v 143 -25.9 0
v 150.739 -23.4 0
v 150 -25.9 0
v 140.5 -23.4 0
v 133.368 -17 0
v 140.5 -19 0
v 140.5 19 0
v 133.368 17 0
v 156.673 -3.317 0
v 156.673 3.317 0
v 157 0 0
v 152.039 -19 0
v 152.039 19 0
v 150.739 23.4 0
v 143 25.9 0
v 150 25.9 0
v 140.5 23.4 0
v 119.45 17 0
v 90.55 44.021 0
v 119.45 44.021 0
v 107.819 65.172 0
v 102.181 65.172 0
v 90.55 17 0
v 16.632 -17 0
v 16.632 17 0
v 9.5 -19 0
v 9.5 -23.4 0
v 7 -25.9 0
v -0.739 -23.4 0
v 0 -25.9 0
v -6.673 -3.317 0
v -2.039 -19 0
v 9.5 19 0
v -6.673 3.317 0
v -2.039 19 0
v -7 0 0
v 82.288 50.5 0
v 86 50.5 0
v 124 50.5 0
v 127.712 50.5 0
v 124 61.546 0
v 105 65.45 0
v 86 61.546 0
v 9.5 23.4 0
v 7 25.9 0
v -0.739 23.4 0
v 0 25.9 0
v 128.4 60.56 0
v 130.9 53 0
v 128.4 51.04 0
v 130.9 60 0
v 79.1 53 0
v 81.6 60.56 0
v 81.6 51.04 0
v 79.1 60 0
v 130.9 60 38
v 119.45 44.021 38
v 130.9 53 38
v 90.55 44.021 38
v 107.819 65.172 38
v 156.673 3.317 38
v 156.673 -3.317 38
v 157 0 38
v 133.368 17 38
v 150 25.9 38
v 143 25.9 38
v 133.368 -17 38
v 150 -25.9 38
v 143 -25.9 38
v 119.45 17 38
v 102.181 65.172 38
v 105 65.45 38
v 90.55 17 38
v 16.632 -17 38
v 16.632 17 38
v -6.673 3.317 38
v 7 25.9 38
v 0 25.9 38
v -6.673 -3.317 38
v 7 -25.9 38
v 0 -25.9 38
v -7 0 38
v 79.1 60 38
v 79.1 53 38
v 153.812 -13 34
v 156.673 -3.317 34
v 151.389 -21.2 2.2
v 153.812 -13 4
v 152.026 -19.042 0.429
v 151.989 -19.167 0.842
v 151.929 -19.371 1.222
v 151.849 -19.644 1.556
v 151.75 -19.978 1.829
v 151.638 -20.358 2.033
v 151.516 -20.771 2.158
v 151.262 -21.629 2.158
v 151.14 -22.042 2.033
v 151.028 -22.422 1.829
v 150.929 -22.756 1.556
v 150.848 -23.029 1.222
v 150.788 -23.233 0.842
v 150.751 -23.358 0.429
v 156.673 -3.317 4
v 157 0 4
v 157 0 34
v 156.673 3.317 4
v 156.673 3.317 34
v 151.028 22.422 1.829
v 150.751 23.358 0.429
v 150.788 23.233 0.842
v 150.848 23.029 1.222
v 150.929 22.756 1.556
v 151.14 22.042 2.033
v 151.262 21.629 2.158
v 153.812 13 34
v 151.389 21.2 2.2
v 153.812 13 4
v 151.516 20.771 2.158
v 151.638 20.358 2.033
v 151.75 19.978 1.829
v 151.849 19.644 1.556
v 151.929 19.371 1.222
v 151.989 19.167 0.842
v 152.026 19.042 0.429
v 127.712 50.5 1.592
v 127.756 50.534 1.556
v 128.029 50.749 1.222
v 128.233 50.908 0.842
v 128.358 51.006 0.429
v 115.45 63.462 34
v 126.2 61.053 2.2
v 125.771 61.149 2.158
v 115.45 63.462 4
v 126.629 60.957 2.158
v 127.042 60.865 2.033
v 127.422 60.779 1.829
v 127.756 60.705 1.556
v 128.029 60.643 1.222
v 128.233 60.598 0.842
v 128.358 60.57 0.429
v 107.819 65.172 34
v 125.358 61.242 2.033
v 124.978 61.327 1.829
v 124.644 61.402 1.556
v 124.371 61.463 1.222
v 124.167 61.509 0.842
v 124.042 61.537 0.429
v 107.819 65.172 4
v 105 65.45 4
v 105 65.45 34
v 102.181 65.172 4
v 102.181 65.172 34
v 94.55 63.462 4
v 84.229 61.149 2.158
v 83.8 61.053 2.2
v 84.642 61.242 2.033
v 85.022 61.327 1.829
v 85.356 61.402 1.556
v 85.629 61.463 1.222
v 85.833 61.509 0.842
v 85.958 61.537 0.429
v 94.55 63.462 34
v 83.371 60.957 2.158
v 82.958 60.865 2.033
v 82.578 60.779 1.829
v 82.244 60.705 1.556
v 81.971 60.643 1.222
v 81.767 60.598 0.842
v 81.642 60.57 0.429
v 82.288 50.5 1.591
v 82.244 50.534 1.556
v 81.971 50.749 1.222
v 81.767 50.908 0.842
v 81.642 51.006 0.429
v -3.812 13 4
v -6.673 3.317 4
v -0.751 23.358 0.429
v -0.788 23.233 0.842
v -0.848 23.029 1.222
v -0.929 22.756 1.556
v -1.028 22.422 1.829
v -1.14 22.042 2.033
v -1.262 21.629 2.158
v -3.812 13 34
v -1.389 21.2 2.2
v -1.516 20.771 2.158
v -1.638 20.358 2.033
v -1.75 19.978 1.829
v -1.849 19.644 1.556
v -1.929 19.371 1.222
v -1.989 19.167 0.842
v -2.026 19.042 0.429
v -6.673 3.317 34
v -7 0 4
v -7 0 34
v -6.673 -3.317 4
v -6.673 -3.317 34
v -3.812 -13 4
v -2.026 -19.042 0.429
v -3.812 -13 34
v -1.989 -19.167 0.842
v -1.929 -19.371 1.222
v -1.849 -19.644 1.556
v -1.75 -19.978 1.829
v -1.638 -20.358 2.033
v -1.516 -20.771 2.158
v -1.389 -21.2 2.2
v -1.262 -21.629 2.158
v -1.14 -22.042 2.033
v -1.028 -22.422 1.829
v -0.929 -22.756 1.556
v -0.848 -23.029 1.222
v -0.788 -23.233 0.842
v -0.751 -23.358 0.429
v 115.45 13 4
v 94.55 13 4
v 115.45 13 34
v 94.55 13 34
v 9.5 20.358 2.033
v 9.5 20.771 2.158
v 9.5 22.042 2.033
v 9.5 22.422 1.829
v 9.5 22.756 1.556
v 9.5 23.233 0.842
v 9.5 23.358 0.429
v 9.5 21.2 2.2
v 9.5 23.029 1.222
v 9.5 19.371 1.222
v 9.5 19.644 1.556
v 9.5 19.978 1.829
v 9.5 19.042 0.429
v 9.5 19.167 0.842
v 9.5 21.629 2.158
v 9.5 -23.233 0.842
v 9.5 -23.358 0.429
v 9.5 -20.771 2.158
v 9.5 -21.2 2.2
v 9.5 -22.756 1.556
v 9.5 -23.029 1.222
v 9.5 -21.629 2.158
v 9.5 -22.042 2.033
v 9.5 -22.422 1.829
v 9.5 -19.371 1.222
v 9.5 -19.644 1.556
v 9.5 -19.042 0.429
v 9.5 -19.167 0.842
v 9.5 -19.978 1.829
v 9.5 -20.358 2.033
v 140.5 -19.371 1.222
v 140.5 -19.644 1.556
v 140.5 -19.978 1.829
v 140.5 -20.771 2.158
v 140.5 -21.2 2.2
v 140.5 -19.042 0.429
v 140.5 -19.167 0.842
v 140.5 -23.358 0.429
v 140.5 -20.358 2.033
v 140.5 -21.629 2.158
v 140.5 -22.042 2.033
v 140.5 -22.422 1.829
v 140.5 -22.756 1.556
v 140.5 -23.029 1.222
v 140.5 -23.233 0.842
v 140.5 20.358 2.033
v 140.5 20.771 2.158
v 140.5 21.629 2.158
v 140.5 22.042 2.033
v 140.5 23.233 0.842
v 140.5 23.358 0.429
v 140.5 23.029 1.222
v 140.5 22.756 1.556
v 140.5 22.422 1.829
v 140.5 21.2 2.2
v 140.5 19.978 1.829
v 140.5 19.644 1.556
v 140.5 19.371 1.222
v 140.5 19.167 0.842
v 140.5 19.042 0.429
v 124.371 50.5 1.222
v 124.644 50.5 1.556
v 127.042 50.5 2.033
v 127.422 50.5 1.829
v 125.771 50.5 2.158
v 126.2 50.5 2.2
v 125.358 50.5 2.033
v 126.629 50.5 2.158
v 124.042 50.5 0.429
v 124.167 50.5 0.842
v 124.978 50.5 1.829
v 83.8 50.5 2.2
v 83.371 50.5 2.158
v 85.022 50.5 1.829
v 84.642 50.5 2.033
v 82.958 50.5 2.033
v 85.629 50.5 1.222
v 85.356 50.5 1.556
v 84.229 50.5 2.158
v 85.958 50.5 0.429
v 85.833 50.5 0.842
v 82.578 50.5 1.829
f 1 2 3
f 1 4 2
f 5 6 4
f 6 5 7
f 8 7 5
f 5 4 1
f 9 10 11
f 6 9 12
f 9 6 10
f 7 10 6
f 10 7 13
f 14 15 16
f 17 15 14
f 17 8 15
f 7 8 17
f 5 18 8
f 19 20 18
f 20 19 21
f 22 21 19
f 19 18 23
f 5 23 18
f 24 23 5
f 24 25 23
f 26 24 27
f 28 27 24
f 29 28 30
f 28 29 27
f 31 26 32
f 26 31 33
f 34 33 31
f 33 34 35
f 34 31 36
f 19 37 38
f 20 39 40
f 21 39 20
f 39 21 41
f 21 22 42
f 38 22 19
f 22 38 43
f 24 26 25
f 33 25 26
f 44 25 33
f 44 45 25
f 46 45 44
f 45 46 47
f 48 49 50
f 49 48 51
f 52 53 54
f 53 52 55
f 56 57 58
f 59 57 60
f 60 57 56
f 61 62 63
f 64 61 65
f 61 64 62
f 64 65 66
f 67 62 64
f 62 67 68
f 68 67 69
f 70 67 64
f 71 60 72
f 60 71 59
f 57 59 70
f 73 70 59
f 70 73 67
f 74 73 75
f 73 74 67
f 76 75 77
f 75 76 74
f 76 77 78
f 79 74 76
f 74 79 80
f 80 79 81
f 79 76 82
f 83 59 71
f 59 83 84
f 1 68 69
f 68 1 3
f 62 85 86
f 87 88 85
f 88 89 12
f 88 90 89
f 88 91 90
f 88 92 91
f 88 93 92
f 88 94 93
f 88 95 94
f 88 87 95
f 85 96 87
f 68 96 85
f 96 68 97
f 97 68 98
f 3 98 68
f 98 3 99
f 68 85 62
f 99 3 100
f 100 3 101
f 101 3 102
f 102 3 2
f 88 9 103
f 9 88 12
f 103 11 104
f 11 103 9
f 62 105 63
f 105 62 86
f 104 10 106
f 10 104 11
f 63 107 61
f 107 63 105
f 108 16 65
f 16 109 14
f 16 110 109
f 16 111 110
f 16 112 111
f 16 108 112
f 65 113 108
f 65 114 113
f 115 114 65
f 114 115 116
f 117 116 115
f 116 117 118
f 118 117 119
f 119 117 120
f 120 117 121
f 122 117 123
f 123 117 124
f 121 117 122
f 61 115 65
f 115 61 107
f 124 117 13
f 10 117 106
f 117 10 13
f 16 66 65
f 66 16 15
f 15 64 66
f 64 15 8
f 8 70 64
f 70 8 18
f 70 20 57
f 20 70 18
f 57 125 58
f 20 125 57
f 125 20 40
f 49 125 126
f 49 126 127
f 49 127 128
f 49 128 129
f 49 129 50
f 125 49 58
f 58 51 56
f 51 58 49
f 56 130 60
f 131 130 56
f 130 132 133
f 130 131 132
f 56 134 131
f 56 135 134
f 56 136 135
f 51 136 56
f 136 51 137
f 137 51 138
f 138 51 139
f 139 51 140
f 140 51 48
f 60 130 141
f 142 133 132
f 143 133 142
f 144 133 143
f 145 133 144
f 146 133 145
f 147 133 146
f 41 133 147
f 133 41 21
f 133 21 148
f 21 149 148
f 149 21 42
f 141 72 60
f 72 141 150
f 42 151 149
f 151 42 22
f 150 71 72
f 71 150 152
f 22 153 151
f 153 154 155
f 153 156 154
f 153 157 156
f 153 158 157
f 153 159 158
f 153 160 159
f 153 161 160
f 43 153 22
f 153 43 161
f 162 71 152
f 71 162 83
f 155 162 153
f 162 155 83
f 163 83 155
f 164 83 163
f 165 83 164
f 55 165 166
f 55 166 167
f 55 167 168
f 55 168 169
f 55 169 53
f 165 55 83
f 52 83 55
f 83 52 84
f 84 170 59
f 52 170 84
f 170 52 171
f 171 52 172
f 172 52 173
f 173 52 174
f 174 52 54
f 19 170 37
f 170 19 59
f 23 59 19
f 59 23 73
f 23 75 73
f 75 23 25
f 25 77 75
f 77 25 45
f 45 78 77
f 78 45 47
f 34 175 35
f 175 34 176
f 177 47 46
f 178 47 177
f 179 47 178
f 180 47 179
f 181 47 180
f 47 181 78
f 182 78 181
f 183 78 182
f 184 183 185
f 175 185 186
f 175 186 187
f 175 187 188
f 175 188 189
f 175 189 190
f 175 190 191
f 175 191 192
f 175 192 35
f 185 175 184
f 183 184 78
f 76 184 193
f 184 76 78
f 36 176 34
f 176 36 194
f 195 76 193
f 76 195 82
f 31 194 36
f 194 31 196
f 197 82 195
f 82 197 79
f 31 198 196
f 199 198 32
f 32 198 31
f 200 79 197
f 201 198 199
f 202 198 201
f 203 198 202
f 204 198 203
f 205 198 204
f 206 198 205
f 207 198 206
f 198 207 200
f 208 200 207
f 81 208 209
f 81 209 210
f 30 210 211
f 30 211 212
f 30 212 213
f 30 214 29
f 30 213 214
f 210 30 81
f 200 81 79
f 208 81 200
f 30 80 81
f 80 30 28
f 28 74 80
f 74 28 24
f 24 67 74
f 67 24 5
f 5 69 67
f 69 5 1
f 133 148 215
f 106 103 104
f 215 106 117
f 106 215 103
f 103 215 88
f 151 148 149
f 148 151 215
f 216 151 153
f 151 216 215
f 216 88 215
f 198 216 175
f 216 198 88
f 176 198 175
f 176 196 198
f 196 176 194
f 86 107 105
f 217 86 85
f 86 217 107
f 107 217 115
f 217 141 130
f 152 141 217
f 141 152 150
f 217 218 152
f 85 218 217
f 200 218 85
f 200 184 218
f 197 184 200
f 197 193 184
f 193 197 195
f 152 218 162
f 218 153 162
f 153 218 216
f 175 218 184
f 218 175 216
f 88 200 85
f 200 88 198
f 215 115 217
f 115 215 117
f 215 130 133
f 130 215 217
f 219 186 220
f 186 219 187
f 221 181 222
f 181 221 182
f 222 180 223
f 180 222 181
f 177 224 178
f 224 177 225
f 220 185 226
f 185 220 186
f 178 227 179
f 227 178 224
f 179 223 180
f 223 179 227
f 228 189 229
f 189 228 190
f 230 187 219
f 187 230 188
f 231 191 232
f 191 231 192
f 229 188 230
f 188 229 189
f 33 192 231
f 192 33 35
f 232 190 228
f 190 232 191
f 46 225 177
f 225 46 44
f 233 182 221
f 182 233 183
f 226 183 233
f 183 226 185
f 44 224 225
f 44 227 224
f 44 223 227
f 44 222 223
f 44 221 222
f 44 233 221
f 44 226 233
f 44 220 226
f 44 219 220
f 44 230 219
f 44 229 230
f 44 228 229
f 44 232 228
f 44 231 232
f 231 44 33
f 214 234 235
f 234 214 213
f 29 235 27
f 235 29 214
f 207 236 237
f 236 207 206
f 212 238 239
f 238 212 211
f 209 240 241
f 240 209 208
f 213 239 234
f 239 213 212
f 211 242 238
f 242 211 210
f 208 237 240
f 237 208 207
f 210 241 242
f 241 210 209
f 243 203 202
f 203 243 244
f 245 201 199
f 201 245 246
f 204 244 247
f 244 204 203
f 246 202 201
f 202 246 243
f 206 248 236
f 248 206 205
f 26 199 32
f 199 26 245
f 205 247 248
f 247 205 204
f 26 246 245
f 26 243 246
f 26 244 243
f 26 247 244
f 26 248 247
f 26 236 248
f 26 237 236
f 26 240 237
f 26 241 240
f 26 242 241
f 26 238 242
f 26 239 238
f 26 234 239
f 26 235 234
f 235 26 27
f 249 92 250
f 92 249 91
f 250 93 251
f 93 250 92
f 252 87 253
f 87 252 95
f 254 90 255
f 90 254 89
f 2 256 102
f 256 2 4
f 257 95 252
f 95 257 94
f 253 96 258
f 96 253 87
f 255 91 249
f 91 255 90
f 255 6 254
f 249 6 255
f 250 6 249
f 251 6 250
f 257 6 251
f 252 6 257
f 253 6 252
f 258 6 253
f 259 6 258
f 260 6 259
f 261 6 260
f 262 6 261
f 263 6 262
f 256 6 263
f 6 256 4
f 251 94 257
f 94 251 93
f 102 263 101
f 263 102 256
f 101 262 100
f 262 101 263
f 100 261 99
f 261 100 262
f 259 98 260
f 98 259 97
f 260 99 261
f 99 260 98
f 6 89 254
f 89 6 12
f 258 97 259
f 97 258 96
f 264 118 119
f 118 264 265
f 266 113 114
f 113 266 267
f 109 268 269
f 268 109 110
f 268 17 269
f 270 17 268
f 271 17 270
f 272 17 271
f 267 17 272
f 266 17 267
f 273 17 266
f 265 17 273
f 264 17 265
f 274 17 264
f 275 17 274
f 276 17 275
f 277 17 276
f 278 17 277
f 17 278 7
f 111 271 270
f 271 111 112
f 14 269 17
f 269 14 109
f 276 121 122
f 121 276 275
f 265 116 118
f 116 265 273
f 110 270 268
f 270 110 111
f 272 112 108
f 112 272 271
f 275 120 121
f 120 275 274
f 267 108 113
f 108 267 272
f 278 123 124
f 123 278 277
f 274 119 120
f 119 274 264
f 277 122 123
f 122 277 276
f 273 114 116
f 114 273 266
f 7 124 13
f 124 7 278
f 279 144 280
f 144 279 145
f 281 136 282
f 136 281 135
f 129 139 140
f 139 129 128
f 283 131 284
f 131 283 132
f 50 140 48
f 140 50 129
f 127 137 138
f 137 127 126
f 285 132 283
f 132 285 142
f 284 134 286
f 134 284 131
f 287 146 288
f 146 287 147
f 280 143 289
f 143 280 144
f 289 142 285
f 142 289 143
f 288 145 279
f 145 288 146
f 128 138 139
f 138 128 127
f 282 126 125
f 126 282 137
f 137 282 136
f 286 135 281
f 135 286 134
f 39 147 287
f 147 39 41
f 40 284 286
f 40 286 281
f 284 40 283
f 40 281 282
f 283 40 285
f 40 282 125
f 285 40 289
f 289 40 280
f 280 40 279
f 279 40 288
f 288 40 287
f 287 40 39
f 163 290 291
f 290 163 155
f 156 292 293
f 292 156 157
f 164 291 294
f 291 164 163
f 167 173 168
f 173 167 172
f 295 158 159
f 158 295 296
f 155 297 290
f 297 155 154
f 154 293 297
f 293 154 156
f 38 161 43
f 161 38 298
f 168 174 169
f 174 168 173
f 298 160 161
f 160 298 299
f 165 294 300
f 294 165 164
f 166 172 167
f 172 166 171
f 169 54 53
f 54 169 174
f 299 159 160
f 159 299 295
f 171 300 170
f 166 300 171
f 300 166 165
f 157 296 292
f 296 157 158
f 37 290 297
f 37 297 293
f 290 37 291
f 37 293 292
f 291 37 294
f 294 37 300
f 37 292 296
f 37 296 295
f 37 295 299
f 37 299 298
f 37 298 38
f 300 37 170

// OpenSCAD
$fn = 32;

// ----------------------------------------------------------------------
// Air duct: 34 mm duct, 4 mm wall, 38 mm across
// ----------------------------------------------------------------------

// --- parameters (mm) ---
duct_r = 17;              // duct core radius
duct_d = 34;              // duct core diameter
wall = 4;                 // duct wall thickness
height = 38;              // duct width (extrusion height)
port_r = 25.9;            // port flange half width
port_d = 51.8;            // port flange width
port_t = 7;               // port flange thickness
bolt_d = 4.4;             // port bolt holes
bolt_offset = 21.2;       // bolt hole offset from the port axis
branch_r = 14.45;         // branch core radius
branch_d = 28.9;          // branch core diameter
branch_len = 60;          // branch length from the run axis

difference() {
  /* outer hull chain: tube with a flat flange plate at every port */
  linear_extrude(height = 38) {
    hull() {
      polygon([[0, -25.9], [0, 25.9], [7, 25.9], [7, -25.9]]);
      translate([10, 0]) circle(r = 17);
    }
    hull() {
      translate([10, 0]) circle(r = 17);
      translate([45, 0]) circle(r = 17);
    }
    hull() {
      translate([45, 0]) circle(r = 17);
      translate([105, 0]) circle(r = 17);
    }
    hull() {
      translate([105, 0]) circle(r = 17);
      translate([140, 0]) circle(r = 17);
    }
    hull() {
      translate([140, 0]) circle(r = 17);
      polygon([[150, 25.9], [150, -25.9], [143, -25.9], [143, 25.9]]);
    }
    hull() {
      translate([105, 0]) circle(r = 14.45);
      translate([105, 33]) circle(r = 14.45);
    }
    hull() {
      translate([105, 33]) circle(r = 14.45);
      translate([105, 51]) circle(r = 14.45);
    }
    hull() {
      translate([105, 51]) circle(r = 14.45);
      polygon([[79.1, 60], [130.9, 60], [130.9, 53], [79.1, 53]]);
    }
  }
  /* air passage: the same chain inset by the wall, 5 mm proud of the ports */
  translate([0, 0, 4]) linear_extrude(height = 30) {
    hull() {
      translate([-5, 0]) circle(r = 13);
      translate([45, 0]) circle(r = 13);
    }
    hull() {
      translate([45, 0]) circle(r = 13);
      translate([105, 0]) circle(r = 13);
    }
    hull() {
      translate([105, 0]) circle(r = 13);
      translate([155, 0]) circle(r = 13);
    }
    hull() {
      translate([105, 0]) circle(r = 10.45);
      translate([105, 33]) circle(r = 10.45);
    }
    hull() {
      translate([105, 33]) circle(r = 10.45);
      translate([105, 65]) circle(r = 10.45);
    }
  }
  translate([0, 0]) rotate([0, 0, -90]) translate([-21.2, -2.5]) rotate([-90, 0, 0]) cylinder(h = 12, d = 4.4);
  translate([0, 0]) rotate([0, 0, -90]) translate([21.2, -2.5]) rotate([-90, 0, 0]) cylinder(h = 12, d = 4.4);
  translate([150, 0]) rotate([0, 0, 90]) translate([-21.2, -2.5]) rotate([-90, 0, 0]) cylinder(h = 12, d = 4.4);
  translate([150, 0]) rotate([0, 0, 90]) translate([21.2, -2.5]) rotate([-90, 0, 0]) cylinder(h = 12, d = 4.4);
  translate([105, 60]) rotate([0, 0, 180]) translate([-21.2, -2.5]) rotate([-90, 0, 0]) cylinder(h = 12, d = 4.4);
  translate([105, 60]) rotate([0, 0, 180]) translate([21.2, -2.5]) rotate([-90, 0, 0]) cylinder(h = 12, d = 4.4);
}
